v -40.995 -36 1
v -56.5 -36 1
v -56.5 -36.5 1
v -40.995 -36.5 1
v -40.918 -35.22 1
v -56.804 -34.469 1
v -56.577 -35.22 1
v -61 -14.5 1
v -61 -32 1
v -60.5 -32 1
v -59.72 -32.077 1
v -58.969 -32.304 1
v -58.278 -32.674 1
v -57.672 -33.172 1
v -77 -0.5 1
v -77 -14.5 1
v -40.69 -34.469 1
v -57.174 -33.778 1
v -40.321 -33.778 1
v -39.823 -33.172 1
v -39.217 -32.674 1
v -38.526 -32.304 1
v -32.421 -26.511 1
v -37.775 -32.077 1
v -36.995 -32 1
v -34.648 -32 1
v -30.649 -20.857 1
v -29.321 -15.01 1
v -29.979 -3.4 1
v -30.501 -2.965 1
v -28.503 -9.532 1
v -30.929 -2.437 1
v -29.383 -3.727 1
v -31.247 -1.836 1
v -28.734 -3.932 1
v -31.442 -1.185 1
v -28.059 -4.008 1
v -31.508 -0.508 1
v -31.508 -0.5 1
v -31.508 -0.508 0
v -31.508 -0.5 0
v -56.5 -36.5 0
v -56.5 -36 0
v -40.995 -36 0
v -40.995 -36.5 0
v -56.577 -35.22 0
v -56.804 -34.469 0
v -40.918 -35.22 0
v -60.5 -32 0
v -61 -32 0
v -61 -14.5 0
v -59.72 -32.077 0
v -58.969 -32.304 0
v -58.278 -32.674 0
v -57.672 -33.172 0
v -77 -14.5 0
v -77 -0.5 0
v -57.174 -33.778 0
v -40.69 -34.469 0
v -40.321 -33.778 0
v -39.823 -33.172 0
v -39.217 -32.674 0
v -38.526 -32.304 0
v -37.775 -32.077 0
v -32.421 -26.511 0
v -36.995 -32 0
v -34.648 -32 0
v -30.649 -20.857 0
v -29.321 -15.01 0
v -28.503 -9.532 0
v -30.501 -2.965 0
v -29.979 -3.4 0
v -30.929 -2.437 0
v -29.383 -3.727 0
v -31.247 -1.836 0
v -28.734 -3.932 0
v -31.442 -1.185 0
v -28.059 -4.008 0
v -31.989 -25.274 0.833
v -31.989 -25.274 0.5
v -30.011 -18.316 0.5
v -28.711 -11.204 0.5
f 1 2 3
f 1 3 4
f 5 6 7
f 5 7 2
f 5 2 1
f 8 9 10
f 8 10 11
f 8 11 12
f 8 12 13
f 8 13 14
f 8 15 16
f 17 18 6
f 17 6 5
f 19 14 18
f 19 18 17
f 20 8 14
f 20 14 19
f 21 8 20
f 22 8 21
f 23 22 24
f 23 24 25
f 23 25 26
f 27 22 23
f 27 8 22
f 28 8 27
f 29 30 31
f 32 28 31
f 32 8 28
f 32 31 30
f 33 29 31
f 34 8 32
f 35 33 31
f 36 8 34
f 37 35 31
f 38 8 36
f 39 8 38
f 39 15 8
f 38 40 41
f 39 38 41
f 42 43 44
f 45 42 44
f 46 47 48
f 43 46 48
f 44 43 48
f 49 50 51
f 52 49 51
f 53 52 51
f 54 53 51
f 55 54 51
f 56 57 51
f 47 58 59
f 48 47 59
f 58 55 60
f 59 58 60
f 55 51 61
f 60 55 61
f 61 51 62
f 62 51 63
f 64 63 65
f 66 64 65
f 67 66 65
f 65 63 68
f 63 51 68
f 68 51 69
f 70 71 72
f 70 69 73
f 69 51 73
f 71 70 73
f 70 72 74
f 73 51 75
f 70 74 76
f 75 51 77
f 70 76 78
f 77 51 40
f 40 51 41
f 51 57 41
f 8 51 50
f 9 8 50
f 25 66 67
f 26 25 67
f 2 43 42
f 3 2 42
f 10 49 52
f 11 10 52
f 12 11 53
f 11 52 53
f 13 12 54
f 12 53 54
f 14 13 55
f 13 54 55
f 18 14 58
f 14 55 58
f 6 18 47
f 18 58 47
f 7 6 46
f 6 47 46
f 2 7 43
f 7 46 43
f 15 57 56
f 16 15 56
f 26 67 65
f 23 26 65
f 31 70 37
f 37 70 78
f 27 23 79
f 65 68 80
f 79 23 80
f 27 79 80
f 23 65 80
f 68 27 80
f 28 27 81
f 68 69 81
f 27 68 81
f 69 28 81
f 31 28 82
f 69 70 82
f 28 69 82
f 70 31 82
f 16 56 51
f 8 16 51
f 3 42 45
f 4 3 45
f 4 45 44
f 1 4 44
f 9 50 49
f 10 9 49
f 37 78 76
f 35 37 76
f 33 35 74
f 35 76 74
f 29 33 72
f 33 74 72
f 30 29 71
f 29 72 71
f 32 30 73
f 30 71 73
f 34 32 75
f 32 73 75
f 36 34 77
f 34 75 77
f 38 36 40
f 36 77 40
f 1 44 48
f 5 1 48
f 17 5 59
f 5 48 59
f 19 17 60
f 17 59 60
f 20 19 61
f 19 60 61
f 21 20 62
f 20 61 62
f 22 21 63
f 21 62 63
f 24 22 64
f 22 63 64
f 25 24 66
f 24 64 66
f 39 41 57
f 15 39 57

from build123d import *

# Parameters (mm, degrees)
EXTRUDE_1_DEPTH = 1


with BuildPart() as part:
    # 草图1 → 凸台-拉伸1 (new body)
    with BuildSketch(Plane.XY):
        with BuildLine():
            Line((-61, -32), (-60.5, -32))
            ThreePointArc((-60.5, -32), (-57.671572875, -33.171572875), (-56.5, -36))
            Line((-56.5, -36), (-56.5, -36.5))
            Line((-56.5, -36.5), (-40.994977349, -36.5))
            Line((-40.994977349, -36.5), (-40.994977349, -36))
            ThreePointArc((-40.994977349, -36), (-39.823404474, -33.171572875), (-36.994977349, -32))
            Line((-36.994977349, -32), (-34.648063919, -32))
            add(Edge.make_bspline(
                [(-34.648063919, -32), (-33.649188035, -29.801521516), (-32.763169649, -27.559357), (-31.602588747, -24.130906164), (-31.243984455, -22.977553874), (-30.584883688, -20.657911853), (-30.284019718, -19.490574743), (-29.738521235, -17.141167899), (-29.493713152, -15.957957975), (-29.060766213, -13.585894928), (-28.872271639, -12.396416473), (-28.388058555, -8.817968759), (-28.173290485, -6.419025656), (-28.058899629, -4.007718216)],
                knots=[0, 0, 0, 0, 0.25, 0.25, 0.375, 0.375, 0.5, 0.5, 0.625, 0.625, 0.75, 0.75, 1, 1, 1, 1], degree=3))
            ThreePointArc((-28.058899629, -4.007718216), (-30.500861029, -2.964930185), (-31.508087081, -0.508087081))
            Line((-31.508087081, -0.508087081), (-31.508087081, -0.5))
            Line((-31.508087081, -0.5), (-77, -0.5))
            Line((-77, -0.5), (-77, -14.5))
            Line((-77, -14.5), (-61, -14.5))
            Line((-61, -14.5), (-61, -32))
        make_face()
    extrude(amount=EXTRUDE_1_DEPTH)


solid = part.part
